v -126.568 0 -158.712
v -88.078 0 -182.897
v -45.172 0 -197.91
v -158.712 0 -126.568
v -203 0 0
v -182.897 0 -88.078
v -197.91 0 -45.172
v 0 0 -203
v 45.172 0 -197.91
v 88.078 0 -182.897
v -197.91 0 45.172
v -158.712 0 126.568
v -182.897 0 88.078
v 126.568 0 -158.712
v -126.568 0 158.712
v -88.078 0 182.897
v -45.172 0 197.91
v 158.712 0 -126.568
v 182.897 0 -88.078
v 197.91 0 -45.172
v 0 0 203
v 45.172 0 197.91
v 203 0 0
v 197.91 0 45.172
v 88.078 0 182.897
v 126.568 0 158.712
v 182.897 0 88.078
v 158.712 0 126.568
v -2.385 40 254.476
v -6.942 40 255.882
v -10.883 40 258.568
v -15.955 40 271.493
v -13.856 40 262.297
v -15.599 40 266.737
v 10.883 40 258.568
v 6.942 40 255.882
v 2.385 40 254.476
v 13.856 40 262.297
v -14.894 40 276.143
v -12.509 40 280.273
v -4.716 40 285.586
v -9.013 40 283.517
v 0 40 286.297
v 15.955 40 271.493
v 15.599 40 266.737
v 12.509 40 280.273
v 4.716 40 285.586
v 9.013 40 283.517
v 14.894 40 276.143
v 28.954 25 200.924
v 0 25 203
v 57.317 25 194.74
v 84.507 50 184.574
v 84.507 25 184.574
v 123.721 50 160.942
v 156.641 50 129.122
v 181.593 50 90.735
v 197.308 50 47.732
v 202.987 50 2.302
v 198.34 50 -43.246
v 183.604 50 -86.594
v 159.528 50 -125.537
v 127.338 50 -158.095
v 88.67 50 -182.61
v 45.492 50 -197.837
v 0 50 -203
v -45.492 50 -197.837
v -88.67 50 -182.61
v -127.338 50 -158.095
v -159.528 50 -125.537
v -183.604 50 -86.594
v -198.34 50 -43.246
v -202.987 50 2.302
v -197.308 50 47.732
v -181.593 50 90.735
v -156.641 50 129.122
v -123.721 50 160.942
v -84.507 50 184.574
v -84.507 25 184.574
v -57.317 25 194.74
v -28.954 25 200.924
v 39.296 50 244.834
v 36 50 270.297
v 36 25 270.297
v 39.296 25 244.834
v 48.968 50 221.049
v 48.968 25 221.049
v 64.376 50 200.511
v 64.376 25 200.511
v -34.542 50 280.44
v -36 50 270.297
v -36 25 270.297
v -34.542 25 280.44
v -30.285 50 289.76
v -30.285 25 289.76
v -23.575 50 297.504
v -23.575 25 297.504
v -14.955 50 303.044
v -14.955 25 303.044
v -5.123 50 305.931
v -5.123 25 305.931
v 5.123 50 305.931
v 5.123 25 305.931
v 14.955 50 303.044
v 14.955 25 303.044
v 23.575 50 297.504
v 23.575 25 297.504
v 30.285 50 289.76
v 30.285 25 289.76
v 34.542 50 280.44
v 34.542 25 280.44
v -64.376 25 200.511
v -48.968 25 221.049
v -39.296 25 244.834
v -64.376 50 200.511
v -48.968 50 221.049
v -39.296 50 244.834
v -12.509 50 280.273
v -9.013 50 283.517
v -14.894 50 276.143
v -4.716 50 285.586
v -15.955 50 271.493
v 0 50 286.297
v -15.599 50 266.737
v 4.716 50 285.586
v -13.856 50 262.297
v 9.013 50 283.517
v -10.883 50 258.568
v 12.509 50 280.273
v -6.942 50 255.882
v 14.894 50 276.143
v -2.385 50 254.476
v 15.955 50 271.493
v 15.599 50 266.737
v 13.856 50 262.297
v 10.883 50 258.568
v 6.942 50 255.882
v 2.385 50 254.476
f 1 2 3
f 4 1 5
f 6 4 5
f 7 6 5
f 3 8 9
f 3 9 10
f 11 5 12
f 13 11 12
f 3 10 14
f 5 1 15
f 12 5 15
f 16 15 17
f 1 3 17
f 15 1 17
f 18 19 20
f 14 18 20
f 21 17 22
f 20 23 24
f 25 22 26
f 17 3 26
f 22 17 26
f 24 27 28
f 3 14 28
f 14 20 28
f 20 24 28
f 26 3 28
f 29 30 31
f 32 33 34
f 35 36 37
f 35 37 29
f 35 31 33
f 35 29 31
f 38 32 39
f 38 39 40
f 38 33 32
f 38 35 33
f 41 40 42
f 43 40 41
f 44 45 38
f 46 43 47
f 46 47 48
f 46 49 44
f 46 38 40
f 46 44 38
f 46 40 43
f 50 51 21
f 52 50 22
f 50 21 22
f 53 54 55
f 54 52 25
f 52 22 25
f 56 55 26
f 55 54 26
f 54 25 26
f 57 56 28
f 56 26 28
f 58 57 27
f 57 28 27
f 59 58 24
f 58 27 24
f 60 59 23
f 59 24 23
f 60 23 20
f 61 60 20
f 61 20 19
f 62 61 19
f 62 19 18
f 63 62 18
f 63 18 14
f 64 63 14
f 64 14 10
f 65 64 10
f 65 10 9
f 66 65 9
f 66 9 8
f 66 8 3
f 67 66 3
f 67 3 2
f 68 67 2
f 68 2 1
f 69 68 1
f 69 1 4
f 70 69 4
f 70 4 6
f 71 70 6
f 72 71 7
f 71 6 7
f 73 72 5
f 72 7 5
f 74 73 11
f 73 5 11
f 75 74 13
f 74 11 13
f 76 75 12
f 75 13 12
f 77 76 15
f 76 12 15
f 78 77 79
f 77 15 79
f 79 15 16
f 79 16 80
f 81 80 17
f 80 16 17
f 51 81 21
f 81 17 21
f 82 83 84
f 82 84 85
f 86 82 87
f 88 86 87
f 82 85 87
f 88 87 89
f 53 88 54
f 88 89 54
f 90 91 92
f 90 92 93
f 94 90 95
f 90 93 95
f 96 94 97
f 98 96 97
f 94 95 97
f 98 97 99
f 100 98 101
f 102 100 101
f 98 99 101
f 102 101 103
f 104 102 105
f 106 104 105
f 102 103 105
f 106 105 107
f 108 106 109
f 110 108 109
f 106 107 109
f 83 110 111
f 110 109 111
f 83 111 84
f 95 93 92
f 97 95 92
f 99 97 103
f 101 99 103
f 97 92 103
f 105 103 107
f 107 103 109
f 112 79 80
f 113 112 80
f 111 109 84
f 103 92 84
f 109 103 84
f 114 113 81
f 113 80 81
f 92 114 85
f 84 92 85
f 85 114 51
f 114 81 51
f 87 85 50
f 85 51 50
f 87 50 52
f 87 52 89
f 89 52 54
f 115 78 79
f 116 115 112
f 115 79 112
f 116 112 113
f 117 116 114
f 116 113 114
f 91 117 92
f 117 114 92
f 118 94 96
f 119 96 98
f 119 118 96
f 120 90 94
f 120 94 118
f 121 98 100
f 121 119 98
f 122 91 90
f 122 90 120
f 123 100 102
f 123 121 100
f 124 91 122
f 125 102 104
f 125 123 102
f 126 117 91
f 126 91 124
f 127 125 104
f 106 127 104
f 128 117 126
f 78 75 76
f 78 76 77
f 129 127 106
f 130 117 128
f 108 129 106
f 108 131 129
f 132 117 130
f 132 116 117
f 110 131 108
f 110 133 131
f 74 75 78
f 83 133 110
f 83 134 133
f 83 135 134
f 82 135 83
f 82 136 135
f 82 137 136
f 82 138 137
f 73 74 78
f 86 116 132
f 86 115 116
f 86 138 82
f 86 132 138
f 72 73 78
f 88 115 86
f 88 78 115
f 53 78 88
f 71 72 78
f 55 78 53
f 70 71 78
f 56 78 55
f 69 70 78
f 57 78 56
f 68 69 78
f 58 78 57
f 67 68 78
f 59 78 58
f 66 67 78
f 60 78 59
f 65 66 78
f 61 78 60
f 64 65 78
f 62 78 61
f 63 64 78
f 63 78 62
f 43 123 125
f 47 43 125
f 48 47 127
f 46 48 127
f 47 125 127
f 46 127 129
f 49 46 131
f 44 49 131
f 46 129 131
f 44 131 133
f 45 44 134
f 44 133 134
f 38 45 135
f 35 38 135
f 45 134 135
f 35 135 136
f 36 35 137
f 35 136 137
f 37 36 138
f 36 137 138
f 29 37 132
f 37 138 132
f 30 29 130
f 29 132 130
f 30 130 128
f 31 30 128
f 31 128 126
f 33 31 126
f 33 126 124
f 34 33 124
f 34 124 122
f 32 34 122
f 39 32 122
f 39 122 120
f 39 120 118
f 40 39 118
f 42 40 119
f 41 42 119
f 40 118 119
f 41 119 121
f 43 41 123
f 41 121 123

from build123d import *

# Parameters (mm, degrees)
SKETCH1_R           = 203
BOSS_EXTRUDE1_DEPTH = 50
BOSS_EXTRUDE2_START = -25
BOSS_EXTRUDE2_DEPTH = 25
SKETCH3_R           = 16
CUT_EXTRUDE1_DEPTH  = 10


with BuildPart() as part:
    # Sketch1 → Boss-Extrude1 (new body)
    with BuildSketch(Plane(origin=(0, 0, 0), x_dir=(1, 0, 0), z_dir=(0, 1, 0))):
        with Locations(Location((0, 0, 0), (0, 0, 270))):
            Circle(SKETCH1_R)
    extrude(amount=BOSS_EXTRUDE1_DEPTH)

    # Sketch2 → Boss-Extrude2 (add)
    with BuildSketch(Plane(origin=(0, 50, 0), x_dir=(1, 0, 0), z_dir=(0, 1, 0)).offset(BOSS_EXTRUDE2_START)):
        with BuildLine():
            ThreePointArc((-36, -270.29723777), (0, -306.29723777), (36, -270.29723777))
            ThreePointArc((36, -270.29723777), (48.967534793, -221.049395178), (84.507, -184.574014831))
            ThreePointArc((84.507, -184.574014831), (0, -203), (-84.507, -184.574014831))
            ThreePointArc((-84.507, -184.574014831), (-48.967534793, -221.049395178), (-36, -270.29723777))
        make_face()
    extrude(amount=BOSS_EXTRUDE2_DEPTH)

    # Sketch3 → Cut-Extrude1 (cut)
    with BuildSketch(Plane(origin=(0, 50, 0), x_dir=(1, 0, 0), z_dir=(0, 1, 0))):
        with Locations(Location((0, -270.29723777, 0), (0, 0, 270))):
            Circle(SKETCH3_R)
    extrude(amount=-CUT_EXTRUDE1_DEPTH, mode=Mode.SUBTRACT)


solid = part.part
